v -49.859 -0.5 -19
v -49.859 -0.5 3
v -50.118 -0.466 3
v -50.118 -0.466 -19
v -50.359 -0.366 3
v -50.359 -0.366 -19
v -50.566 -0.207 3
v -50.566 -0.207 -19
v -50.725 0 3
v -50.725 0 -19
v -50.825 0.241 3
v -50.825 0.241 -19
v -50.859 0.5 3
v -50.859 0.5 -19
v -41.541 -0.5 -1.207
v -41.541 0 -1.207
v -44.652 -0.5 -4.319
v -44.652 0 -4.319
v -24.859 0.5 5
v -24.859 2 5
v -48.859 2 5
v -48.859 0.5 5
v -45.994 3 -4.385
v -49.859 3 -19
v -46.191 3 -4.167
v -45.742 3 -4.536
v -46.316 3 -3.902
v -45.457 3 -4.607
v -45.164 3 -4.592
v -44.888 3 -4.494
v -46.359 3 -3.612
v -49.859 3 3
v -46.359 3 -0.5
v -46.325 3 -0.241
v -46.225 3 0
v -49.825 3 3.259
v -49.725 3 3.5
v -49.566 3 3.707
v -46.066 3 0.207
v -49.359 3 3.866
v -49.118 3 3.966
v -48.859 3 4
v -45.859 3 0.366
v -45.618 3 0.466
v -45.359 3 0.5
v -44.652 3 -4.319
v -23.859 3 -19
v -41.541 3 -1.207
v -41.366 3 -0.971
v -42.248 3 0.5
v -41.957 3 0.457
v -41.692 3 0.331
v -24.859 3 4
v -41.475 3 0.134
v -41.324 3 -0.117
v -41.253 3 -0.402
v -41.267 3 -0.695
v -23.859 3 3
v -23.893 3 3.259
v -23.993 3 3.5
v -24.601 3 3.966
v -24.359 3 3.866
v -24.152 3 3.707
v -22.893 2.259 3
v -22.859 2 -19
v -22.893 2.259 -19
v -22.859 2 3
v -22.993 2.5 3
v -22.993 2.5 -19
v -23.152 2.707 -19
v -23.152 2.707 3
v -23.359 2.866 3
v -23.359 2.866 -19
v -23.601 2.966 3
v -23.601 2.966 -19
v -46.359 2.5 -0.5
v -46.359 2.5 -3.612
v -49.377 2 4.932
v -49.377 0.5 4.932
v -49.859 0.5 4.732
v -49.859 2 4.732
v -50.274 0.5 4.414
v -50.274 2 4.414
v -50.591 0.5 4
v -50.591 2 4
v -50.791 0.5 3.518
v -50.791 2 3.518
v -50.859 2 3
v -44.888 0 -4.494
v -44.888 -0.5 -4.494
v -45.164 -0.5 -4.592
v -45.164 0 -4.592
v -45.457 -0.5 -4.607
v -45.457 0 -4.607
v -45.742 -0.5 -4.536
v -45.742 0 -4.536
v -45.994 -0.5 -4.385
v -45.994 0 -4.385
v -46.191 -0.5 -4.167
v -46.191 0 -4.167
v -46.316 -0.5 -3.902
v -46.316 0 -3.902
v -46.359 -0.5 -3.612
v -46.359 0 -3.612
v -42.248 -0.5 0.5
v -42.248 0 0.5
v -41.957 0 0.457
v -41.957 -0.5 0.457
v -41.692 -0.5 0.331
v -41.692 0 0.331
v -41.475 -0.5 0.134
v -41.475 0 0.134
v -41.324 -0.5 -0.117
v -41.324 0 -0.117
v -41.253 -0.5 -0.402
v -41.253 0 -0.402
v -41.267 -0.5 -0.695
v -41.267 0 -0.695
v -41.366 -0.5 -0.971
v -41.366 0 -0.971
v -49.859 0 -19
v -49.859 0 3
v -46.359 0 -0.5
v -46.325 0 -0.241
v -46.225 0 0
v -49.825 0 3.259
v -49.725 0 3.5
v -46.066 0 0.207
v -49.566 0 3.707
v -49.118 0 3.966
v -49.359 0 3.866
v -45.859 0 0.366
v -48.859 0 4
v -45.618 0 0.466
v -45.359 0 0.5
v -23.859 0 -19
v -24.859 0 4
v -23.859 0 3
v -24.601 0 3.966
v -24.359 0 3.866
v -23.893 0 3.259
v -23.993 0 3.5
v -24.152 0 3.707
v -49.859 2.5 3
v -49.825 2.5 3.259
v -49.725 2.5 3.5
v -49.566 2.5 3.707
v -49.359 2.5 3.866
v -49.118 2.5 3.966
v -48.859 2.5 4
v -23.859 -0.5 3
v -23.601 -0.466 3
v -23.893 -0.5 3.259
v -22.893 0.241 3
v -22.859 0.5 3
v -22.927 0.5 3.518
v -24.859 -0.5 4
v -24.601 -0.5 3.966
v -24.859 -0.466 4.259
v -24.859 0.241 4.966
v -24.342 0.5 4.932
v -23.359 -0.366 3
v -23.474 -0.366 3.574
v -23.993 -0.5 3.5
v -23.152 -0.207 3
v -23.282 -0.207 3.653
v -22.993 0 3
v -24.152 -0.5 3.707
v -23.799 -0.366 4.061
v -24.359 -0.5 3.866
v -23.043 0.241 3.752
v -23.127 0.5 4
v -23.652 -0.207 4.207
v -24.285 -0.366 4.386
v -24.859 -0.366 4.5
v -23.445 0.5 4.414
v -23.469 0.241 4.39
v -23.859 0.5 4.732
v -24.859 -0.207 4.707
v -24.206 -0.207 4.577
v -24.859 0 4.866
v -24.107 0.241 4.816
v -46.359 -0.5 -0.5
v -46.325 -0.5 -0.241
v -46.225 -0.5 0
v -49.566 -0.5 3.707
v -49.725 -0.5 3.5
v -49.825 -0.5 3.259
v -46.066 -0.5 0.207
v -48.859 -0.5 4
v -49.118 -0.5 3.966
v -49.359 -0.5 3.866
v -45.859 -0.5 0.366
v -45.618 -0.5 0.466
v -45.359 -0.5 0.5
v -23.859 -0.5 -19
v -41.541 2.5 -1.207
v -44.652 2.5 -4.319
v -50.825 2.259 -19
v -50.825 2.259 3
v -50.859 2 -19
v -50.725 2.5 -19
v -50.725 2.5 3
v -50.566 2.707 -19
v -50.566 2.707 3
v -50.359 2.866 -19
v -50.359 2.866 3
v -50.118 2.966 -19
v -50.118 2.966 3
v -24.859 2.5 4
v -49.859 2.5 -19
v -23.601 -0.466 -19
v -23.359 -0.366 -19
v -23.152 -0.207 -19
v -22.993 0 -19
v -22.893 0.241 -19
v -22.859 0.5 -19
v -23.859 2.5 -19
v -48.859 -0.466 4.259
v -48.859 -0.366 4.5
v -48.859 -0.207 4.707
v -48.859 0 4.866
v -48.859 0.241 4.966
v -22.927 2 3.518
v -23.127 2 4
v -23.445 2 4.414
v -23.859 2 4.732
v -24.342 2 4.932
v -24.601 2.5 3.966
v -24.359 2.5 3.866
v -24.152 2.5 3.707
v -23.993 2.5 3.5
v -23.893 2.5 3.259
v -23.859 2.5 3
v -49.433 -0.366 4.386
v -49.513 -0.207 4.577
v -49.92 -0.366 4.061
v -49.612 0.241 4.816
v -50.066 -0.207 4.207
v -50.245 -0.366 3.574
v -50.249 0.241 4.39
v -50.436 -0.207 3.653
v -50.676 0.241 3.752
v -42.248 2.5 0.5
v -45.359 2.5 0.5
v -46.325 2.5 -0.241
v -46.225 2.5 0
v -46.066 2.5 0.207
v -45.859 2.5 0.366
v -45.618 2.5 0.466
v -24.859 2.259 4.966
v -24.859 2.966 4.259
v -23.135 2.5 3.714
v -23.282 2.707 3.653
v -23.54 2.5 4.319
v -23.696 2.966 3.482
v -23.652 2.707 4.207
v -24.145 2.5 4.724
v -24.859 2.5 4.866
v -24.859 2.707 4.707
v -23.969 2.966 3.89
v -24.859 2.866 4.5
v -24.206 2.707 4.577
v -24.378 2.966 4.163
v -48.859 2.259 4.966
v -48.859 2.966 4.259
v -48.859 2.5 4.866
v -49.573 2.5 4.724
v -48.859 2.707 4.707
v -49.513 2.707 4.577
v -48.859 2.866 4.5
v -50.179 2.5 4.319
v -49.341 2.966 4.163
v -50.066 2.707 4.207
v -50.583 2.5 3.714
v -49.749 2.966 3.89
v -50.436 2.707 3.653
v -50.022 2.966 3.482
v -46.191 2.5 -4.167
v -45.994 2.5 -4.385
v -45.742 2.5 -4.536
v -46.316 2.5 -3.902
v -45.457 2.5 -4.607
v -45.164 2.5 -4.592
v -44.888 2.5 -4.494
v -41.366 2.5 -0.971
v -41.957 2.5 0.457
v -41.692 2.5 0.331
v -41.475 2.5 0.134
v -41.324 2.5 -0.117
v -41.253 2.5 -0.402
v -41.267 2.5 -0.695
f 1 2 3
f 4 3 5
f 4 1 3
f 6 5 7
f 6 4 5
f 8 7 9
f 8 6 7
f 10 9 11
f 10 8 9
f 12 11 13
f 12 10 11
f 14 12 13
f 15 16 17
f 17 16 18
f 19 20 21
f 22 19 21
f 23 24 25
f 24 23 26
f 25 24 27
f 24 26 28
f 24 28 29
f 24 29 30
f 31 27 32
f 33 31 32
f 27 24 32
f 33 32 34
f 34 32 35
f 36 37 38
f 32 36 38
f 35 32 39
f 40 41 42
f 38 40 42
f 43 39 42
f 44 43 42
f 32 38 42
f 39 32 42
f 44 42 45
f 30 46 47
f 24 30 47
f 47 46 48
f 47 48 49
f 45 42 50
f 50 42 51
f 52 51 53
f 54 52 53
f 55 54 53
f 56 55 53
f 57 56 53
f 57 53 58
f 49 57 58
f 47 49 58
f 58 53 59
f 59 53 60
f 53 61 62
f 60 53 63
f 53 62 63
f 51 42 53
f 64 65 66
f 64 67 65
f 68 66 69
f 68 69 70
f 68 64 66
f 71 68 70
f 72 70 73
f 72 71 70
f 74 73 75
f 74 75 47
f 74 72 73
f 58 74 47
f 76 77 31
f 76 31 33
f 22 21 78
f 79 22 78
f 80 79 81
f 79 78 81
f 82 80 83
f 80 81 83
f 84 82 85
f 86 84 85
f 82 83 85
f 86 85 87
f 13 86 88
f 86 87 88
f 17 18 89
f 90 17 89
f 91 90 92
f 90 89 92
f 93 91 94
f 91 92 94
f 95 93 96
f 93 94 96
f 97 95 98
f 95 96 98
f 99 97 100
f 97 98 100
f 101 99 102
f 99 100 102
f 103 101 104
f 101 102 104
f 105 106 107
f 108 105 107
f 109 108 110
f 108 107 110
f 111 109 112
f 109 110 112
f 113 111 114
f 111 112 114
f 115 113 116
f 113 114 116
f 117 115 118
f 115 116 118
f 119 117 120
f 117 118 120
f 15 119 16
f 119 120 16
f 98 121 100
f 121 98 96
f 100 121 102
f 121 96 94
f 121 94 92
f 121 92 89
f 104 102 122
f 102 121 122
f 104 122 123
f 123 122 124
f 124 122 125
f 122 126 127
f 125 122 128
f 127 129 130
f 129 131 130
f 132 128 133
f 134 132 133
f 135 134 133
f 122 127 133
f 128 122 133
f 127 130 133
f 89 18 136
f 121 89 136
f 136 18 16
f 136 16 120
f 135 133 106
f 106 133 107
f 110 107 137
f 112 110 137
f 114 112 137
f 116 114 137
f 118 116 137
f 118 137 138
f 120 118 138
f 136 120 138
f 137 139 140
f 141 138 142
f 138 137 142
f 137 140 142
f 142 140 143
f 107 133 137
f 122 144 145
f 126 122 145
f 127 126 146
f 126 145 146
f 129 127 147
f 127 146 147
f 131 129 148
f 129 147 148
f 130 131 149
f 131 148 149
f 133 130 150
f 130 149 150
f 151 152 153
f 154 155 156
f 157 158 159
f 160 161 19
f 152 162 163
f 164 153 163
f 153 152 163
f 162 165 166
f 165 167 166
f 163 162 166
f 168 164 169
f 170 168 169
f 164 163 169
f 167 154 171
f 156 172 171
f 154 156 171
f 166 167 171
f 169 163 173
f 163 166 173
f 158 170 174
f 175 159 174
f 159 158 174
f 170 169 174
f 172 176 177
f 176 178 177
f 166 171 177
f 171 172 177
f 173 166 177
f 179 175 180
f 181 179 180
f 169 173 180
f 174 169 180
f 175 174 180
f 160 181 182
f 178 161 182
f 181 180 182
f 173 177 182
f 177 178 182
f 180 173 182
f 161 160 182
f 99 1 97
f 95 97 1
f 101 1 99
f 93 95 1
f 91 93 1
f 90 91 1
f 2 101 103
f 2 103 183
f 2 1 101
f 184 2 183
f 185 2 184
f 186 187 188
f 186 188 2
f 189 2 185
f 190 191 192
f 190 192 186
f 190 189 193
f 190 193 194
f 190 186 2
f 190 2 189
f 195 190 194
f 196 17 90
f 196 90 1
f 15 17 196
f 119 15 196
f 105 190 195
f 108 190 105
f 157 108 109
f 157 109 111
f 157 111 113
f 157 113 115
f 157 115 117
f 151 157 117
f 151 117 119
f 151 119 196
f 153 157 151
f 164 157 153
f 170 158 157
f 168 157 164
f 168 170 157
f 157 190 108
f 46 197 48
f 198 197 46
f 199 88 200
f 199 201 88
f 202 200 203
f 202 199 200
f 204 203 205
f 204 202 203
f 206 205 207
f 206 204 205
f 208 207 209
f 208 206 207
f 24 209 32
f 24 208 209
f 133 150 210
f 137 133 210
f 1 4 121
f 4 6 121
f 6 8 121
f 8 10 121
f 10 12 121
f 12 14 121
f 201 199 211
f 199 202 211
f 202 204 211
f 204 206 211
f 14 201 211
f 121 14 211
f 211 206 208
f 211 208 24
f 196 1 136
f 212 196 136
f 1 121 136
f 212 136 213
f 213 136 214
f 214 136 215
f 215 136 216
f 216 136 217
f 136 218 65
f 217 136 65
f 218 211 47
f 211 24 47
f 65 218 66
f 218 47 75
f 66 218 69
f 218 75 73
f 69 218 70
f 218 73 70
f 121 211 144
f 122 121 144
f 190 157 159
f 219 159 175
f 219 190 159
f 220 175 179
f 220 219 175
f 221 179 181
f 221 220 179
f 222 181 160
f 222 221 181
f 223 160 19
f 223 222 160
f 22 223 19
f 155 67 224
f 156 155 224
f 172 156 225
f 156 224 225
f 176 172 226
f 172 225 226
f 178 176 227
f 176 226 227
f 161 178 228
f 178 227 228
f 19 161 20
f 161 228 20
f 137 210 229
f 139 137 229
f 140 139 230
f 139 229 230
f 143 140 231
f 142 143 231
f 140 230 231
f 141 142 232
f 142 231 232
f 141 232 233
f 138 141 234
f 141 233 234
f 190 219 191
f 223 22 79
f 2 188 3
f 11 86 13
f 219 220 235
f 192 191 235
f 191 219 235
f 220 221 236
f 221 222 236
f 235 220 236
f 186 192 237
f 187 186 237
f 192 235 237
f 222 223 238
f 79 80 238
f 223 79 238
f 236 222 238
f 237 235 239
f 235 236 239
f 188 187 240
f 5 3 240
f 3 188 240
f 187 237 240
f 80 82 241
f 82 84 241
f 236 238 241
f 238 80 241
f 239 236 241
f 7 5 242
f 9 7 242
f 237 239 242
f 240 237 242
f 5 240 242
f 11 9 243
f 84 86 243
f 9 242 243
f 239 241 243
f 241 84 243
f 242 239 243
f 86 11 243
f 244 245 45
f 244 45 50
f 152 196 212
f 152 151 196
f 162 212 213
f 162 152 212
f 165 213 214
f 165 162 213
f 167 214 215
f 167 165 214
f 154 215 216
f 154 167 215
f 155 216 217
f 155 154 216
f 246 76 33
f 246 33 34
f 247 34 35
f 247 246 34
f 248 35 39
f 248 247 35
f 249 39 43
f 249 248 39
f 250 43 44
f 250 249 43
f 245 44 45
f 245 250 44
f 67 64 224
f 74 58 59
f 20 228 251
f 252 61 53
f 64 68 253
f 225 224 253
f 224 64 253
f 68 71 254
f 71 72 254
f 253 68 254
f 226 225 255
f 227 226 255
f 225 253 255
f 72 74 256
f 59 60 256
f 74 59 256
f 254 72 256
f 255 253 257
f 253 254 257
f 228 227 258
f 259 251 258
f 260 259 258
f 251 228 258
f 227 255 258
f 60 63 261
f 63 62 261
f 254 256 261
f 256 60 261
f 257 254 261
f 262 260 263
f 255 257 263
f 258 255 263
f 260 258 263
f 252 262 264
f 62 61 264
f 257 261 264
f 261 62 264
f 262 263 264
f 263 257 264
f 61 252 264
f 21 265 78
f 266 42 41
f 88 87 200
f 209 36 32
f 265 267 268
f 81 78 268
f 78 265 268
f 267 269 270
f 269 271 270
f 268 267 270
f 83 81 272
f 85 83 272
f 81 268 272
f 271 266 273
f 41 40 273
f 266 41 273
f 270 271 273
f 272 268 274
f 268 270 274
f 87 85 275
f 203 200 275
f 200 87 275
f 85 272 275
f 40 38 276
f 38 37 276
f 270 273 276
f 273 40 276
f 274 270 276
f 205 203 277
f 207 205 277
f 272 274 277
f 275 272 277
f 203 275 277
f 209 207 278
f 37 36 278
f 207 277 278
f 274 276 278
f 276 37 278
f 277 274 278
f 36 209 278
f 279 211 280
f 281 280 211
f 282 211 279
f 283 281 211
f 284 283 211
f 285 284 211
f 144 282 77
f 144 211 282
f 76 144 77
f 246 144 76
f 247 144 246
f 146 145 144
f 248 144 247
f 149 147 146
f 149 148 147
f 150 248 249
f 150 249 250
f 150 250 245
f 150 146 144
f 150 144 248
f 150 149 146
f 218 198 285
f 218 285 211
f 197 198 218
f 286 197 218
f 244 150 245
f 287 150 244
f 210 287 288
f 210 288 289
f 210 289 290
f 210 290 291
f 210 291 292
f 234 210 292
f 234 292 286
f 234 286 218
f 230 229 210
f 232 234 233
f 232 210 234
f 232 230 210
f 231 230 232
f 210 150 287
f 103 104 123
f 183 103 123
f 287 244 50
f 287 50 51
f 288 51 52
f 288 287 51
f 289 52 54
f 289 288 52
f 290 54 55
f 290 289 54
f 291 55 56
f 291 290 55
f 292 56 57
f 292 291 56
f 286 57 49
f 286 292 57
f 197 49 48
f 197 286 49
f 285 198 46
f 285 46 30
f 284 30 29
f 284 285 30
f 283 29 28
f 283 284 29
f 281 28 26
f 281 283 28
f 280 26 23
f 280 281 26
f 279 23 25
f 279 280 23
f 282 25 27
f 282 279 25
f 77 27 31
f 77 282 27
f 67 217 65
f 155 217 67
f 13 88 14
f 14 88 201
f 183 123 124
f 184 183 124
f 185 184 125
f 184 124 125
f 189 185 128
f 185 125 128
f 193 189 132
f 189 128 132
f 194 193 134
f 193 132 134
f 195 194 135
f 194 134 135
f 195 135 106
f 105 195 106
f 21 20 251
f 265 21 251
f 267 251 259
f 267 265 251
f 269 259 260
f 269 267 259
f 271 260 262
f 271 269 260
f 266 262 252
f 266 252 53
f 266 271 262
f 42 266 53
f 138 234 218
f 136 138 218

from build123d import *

# Parameters (mm, degrees)
F1_DEPTH = 0.5
F2_DEPTH = 1.25
F5_R     = 1


with BuildPart() as f1:
    # F0 (on Front) → F1 (new body)
    with BuildSketch(Plane.XZ):
        with BuildLine():
            Line((-50.8593195975, 0), (-50.8593195975, -19))
            Line((-50.8593195975, -19), (-49.8593195975, -19))
            Line((-49.8593195975, -19), (-49.8593195975, 3))
            ThreePointArc((-49.8593195975, 3), (-49.5664263787, 3.7071067812), (-48.8593195975, 4))
            Line((-48.8593195975, 4), (-24.8593195975, 4))
            ThreePointArc((-24.8593195975, 4), (-24.1522128163, 3.7071067812), (-23.8593195975, 3))
            Line((-23.8593195975, 3), (-23.8593195975, -19))
            Line((-23.8593195975, -19), (-22.8593195975, -19))
            Line((-22.8593195975, -19), (-22.8593195975, 0))
            Line((-22.8593195975, 0), (-22.8593195975, 3))
            ThreePointArc((-22.8593195975, 3), (-23.4451060351, 4.4142135624), (-24.8593195975, 5))
            Line((-24.8593195975, 5), (-27.8593195975, 5))
            Line((-27.8593195975, 5), (-45.8593195975, 5))
            Line((-45.8593195975, 5), (-48.8593195975, 5))
            ThreePointArc((-48.8593195975, 5), (-50.2735331599, 4.4142135624), (-50.8593195975, 3))
            Line((-50.8593195975, 3), (-50.8593195975, 0))
        make_face()
        with BuildLine():
            Line((-49.8593195975, 3), (-49.8593195975, -19))
            Line((-49.8593195975, -19), (-23.8593195975, -19))
            Line((-23.8593195975, -19), (-23.8593195975, 3))
            ThreePointArc((-23.8593195975, 3), (-24.1522128163, 3.7071067812), (-24.8593195975, 4))
            Line((-24.8593195975, 4), (-48.8593195975, 4))
            ThreePointArc((-48.8593195975, 4), (-49.5664263787, 3.7071067812), (-49.8593195975, 3))
        make_face()
        with BuildLine():
            Line((-41.5405858453, -1.2071067812), (-44.6522128163, -4.3187337522))
            ThreePointArc((-44.6522128163, -4.3187337522), (-45.7420030298, -4.5355065035), (-46.3593195975, -3.611626971))
            Line((-46.3593195975, -3.611626971), (-46.3593195975, -0.5))
            ThreePointArc((-46.3593195975, -0.5), (-46.0664263787, 0.2071067812), (-45.3593195975, 0.5))
            Line((-45.3593195975, 0.5), (-42.2476926265, 0.5))
            ThreePointArc((-42.2476926265, 0.5), (-41.323813094, -0.1173165676), (-41.5405858453, -1.2071067812))
        make_face(mode=Mode.SUBTRACT)
    extrude(amount=F1_DEPTH)

    # F0 (on Front) → F2 (join)
    with BuildSketch(Plane.XZ):
        with BuildLine():
            Line((-50.8593195975, 0), (-50.8593195975, -19))
            Line((-50.8593195975, -19), (-49.8593195975, -19))
            Line((-49.8593195975, -19), (-49.8593195975, 3))
            ThreePointArc((-49.8593195975, 3), (-49.5664263787, 3.7071067812), (-48.8593195975, 4))
            Line((-48.8593195975, 4), (-24.8593195975, 4))
            ThreePointArc((-24.8593195975, 4), (-24.1522128163, 3.7071067812), (-23.8593195975, 3))
            Line((-23.8593195975, 3), (-23.8593195975, -19))
            Line((-23.8593195975, -19), (-22.8593195975, -19))
            Line((-22.8593195975, -19), (-22.8593195975, 0))
            Line((-22.8593195975, 0), (-22.8593195975, 3))
            ThreePointArc((-22.8593195975, 3), (-23.4451060351, 4.4142135624), (-24.8593195975, 5))
            Line((-24.8593195975, 5), (-27.8593195975, 5))
            Line((-27.8593195975, 5), (-45.8593195975, 5))
            Line((-45.8593195975, 5), (-48.8593195975, 5))
            ThreePointArc((-48.8593195975, 5), (-50.2735331599, 4.4142135624), (-50.8593195975, 3))
            Line((-50.8593195975, 3), (-50.8593195975, 0))
        make_face()
    extrude(amount=-F2_DEPTH)

    # F4: F1 across plane


with BuildPart() as f1_1:
    add(f1.part)
    add(f1.part.mirror(Plane(origin=(-36.8593195975, 1.25, -3.0970811102), x_dir=(1, 0, 0), z_dir=(0, 1, 0))))

    # F5
    f5_edges = [f1_1.edges().sort_by_distance(p)[0] for p in [
        (-50.85932, 3, -8),
        (-50.85932, -0.5, -8),
    ]]
    fillet(f5_edges, radius=F5_R)


solid = f1_1.part
